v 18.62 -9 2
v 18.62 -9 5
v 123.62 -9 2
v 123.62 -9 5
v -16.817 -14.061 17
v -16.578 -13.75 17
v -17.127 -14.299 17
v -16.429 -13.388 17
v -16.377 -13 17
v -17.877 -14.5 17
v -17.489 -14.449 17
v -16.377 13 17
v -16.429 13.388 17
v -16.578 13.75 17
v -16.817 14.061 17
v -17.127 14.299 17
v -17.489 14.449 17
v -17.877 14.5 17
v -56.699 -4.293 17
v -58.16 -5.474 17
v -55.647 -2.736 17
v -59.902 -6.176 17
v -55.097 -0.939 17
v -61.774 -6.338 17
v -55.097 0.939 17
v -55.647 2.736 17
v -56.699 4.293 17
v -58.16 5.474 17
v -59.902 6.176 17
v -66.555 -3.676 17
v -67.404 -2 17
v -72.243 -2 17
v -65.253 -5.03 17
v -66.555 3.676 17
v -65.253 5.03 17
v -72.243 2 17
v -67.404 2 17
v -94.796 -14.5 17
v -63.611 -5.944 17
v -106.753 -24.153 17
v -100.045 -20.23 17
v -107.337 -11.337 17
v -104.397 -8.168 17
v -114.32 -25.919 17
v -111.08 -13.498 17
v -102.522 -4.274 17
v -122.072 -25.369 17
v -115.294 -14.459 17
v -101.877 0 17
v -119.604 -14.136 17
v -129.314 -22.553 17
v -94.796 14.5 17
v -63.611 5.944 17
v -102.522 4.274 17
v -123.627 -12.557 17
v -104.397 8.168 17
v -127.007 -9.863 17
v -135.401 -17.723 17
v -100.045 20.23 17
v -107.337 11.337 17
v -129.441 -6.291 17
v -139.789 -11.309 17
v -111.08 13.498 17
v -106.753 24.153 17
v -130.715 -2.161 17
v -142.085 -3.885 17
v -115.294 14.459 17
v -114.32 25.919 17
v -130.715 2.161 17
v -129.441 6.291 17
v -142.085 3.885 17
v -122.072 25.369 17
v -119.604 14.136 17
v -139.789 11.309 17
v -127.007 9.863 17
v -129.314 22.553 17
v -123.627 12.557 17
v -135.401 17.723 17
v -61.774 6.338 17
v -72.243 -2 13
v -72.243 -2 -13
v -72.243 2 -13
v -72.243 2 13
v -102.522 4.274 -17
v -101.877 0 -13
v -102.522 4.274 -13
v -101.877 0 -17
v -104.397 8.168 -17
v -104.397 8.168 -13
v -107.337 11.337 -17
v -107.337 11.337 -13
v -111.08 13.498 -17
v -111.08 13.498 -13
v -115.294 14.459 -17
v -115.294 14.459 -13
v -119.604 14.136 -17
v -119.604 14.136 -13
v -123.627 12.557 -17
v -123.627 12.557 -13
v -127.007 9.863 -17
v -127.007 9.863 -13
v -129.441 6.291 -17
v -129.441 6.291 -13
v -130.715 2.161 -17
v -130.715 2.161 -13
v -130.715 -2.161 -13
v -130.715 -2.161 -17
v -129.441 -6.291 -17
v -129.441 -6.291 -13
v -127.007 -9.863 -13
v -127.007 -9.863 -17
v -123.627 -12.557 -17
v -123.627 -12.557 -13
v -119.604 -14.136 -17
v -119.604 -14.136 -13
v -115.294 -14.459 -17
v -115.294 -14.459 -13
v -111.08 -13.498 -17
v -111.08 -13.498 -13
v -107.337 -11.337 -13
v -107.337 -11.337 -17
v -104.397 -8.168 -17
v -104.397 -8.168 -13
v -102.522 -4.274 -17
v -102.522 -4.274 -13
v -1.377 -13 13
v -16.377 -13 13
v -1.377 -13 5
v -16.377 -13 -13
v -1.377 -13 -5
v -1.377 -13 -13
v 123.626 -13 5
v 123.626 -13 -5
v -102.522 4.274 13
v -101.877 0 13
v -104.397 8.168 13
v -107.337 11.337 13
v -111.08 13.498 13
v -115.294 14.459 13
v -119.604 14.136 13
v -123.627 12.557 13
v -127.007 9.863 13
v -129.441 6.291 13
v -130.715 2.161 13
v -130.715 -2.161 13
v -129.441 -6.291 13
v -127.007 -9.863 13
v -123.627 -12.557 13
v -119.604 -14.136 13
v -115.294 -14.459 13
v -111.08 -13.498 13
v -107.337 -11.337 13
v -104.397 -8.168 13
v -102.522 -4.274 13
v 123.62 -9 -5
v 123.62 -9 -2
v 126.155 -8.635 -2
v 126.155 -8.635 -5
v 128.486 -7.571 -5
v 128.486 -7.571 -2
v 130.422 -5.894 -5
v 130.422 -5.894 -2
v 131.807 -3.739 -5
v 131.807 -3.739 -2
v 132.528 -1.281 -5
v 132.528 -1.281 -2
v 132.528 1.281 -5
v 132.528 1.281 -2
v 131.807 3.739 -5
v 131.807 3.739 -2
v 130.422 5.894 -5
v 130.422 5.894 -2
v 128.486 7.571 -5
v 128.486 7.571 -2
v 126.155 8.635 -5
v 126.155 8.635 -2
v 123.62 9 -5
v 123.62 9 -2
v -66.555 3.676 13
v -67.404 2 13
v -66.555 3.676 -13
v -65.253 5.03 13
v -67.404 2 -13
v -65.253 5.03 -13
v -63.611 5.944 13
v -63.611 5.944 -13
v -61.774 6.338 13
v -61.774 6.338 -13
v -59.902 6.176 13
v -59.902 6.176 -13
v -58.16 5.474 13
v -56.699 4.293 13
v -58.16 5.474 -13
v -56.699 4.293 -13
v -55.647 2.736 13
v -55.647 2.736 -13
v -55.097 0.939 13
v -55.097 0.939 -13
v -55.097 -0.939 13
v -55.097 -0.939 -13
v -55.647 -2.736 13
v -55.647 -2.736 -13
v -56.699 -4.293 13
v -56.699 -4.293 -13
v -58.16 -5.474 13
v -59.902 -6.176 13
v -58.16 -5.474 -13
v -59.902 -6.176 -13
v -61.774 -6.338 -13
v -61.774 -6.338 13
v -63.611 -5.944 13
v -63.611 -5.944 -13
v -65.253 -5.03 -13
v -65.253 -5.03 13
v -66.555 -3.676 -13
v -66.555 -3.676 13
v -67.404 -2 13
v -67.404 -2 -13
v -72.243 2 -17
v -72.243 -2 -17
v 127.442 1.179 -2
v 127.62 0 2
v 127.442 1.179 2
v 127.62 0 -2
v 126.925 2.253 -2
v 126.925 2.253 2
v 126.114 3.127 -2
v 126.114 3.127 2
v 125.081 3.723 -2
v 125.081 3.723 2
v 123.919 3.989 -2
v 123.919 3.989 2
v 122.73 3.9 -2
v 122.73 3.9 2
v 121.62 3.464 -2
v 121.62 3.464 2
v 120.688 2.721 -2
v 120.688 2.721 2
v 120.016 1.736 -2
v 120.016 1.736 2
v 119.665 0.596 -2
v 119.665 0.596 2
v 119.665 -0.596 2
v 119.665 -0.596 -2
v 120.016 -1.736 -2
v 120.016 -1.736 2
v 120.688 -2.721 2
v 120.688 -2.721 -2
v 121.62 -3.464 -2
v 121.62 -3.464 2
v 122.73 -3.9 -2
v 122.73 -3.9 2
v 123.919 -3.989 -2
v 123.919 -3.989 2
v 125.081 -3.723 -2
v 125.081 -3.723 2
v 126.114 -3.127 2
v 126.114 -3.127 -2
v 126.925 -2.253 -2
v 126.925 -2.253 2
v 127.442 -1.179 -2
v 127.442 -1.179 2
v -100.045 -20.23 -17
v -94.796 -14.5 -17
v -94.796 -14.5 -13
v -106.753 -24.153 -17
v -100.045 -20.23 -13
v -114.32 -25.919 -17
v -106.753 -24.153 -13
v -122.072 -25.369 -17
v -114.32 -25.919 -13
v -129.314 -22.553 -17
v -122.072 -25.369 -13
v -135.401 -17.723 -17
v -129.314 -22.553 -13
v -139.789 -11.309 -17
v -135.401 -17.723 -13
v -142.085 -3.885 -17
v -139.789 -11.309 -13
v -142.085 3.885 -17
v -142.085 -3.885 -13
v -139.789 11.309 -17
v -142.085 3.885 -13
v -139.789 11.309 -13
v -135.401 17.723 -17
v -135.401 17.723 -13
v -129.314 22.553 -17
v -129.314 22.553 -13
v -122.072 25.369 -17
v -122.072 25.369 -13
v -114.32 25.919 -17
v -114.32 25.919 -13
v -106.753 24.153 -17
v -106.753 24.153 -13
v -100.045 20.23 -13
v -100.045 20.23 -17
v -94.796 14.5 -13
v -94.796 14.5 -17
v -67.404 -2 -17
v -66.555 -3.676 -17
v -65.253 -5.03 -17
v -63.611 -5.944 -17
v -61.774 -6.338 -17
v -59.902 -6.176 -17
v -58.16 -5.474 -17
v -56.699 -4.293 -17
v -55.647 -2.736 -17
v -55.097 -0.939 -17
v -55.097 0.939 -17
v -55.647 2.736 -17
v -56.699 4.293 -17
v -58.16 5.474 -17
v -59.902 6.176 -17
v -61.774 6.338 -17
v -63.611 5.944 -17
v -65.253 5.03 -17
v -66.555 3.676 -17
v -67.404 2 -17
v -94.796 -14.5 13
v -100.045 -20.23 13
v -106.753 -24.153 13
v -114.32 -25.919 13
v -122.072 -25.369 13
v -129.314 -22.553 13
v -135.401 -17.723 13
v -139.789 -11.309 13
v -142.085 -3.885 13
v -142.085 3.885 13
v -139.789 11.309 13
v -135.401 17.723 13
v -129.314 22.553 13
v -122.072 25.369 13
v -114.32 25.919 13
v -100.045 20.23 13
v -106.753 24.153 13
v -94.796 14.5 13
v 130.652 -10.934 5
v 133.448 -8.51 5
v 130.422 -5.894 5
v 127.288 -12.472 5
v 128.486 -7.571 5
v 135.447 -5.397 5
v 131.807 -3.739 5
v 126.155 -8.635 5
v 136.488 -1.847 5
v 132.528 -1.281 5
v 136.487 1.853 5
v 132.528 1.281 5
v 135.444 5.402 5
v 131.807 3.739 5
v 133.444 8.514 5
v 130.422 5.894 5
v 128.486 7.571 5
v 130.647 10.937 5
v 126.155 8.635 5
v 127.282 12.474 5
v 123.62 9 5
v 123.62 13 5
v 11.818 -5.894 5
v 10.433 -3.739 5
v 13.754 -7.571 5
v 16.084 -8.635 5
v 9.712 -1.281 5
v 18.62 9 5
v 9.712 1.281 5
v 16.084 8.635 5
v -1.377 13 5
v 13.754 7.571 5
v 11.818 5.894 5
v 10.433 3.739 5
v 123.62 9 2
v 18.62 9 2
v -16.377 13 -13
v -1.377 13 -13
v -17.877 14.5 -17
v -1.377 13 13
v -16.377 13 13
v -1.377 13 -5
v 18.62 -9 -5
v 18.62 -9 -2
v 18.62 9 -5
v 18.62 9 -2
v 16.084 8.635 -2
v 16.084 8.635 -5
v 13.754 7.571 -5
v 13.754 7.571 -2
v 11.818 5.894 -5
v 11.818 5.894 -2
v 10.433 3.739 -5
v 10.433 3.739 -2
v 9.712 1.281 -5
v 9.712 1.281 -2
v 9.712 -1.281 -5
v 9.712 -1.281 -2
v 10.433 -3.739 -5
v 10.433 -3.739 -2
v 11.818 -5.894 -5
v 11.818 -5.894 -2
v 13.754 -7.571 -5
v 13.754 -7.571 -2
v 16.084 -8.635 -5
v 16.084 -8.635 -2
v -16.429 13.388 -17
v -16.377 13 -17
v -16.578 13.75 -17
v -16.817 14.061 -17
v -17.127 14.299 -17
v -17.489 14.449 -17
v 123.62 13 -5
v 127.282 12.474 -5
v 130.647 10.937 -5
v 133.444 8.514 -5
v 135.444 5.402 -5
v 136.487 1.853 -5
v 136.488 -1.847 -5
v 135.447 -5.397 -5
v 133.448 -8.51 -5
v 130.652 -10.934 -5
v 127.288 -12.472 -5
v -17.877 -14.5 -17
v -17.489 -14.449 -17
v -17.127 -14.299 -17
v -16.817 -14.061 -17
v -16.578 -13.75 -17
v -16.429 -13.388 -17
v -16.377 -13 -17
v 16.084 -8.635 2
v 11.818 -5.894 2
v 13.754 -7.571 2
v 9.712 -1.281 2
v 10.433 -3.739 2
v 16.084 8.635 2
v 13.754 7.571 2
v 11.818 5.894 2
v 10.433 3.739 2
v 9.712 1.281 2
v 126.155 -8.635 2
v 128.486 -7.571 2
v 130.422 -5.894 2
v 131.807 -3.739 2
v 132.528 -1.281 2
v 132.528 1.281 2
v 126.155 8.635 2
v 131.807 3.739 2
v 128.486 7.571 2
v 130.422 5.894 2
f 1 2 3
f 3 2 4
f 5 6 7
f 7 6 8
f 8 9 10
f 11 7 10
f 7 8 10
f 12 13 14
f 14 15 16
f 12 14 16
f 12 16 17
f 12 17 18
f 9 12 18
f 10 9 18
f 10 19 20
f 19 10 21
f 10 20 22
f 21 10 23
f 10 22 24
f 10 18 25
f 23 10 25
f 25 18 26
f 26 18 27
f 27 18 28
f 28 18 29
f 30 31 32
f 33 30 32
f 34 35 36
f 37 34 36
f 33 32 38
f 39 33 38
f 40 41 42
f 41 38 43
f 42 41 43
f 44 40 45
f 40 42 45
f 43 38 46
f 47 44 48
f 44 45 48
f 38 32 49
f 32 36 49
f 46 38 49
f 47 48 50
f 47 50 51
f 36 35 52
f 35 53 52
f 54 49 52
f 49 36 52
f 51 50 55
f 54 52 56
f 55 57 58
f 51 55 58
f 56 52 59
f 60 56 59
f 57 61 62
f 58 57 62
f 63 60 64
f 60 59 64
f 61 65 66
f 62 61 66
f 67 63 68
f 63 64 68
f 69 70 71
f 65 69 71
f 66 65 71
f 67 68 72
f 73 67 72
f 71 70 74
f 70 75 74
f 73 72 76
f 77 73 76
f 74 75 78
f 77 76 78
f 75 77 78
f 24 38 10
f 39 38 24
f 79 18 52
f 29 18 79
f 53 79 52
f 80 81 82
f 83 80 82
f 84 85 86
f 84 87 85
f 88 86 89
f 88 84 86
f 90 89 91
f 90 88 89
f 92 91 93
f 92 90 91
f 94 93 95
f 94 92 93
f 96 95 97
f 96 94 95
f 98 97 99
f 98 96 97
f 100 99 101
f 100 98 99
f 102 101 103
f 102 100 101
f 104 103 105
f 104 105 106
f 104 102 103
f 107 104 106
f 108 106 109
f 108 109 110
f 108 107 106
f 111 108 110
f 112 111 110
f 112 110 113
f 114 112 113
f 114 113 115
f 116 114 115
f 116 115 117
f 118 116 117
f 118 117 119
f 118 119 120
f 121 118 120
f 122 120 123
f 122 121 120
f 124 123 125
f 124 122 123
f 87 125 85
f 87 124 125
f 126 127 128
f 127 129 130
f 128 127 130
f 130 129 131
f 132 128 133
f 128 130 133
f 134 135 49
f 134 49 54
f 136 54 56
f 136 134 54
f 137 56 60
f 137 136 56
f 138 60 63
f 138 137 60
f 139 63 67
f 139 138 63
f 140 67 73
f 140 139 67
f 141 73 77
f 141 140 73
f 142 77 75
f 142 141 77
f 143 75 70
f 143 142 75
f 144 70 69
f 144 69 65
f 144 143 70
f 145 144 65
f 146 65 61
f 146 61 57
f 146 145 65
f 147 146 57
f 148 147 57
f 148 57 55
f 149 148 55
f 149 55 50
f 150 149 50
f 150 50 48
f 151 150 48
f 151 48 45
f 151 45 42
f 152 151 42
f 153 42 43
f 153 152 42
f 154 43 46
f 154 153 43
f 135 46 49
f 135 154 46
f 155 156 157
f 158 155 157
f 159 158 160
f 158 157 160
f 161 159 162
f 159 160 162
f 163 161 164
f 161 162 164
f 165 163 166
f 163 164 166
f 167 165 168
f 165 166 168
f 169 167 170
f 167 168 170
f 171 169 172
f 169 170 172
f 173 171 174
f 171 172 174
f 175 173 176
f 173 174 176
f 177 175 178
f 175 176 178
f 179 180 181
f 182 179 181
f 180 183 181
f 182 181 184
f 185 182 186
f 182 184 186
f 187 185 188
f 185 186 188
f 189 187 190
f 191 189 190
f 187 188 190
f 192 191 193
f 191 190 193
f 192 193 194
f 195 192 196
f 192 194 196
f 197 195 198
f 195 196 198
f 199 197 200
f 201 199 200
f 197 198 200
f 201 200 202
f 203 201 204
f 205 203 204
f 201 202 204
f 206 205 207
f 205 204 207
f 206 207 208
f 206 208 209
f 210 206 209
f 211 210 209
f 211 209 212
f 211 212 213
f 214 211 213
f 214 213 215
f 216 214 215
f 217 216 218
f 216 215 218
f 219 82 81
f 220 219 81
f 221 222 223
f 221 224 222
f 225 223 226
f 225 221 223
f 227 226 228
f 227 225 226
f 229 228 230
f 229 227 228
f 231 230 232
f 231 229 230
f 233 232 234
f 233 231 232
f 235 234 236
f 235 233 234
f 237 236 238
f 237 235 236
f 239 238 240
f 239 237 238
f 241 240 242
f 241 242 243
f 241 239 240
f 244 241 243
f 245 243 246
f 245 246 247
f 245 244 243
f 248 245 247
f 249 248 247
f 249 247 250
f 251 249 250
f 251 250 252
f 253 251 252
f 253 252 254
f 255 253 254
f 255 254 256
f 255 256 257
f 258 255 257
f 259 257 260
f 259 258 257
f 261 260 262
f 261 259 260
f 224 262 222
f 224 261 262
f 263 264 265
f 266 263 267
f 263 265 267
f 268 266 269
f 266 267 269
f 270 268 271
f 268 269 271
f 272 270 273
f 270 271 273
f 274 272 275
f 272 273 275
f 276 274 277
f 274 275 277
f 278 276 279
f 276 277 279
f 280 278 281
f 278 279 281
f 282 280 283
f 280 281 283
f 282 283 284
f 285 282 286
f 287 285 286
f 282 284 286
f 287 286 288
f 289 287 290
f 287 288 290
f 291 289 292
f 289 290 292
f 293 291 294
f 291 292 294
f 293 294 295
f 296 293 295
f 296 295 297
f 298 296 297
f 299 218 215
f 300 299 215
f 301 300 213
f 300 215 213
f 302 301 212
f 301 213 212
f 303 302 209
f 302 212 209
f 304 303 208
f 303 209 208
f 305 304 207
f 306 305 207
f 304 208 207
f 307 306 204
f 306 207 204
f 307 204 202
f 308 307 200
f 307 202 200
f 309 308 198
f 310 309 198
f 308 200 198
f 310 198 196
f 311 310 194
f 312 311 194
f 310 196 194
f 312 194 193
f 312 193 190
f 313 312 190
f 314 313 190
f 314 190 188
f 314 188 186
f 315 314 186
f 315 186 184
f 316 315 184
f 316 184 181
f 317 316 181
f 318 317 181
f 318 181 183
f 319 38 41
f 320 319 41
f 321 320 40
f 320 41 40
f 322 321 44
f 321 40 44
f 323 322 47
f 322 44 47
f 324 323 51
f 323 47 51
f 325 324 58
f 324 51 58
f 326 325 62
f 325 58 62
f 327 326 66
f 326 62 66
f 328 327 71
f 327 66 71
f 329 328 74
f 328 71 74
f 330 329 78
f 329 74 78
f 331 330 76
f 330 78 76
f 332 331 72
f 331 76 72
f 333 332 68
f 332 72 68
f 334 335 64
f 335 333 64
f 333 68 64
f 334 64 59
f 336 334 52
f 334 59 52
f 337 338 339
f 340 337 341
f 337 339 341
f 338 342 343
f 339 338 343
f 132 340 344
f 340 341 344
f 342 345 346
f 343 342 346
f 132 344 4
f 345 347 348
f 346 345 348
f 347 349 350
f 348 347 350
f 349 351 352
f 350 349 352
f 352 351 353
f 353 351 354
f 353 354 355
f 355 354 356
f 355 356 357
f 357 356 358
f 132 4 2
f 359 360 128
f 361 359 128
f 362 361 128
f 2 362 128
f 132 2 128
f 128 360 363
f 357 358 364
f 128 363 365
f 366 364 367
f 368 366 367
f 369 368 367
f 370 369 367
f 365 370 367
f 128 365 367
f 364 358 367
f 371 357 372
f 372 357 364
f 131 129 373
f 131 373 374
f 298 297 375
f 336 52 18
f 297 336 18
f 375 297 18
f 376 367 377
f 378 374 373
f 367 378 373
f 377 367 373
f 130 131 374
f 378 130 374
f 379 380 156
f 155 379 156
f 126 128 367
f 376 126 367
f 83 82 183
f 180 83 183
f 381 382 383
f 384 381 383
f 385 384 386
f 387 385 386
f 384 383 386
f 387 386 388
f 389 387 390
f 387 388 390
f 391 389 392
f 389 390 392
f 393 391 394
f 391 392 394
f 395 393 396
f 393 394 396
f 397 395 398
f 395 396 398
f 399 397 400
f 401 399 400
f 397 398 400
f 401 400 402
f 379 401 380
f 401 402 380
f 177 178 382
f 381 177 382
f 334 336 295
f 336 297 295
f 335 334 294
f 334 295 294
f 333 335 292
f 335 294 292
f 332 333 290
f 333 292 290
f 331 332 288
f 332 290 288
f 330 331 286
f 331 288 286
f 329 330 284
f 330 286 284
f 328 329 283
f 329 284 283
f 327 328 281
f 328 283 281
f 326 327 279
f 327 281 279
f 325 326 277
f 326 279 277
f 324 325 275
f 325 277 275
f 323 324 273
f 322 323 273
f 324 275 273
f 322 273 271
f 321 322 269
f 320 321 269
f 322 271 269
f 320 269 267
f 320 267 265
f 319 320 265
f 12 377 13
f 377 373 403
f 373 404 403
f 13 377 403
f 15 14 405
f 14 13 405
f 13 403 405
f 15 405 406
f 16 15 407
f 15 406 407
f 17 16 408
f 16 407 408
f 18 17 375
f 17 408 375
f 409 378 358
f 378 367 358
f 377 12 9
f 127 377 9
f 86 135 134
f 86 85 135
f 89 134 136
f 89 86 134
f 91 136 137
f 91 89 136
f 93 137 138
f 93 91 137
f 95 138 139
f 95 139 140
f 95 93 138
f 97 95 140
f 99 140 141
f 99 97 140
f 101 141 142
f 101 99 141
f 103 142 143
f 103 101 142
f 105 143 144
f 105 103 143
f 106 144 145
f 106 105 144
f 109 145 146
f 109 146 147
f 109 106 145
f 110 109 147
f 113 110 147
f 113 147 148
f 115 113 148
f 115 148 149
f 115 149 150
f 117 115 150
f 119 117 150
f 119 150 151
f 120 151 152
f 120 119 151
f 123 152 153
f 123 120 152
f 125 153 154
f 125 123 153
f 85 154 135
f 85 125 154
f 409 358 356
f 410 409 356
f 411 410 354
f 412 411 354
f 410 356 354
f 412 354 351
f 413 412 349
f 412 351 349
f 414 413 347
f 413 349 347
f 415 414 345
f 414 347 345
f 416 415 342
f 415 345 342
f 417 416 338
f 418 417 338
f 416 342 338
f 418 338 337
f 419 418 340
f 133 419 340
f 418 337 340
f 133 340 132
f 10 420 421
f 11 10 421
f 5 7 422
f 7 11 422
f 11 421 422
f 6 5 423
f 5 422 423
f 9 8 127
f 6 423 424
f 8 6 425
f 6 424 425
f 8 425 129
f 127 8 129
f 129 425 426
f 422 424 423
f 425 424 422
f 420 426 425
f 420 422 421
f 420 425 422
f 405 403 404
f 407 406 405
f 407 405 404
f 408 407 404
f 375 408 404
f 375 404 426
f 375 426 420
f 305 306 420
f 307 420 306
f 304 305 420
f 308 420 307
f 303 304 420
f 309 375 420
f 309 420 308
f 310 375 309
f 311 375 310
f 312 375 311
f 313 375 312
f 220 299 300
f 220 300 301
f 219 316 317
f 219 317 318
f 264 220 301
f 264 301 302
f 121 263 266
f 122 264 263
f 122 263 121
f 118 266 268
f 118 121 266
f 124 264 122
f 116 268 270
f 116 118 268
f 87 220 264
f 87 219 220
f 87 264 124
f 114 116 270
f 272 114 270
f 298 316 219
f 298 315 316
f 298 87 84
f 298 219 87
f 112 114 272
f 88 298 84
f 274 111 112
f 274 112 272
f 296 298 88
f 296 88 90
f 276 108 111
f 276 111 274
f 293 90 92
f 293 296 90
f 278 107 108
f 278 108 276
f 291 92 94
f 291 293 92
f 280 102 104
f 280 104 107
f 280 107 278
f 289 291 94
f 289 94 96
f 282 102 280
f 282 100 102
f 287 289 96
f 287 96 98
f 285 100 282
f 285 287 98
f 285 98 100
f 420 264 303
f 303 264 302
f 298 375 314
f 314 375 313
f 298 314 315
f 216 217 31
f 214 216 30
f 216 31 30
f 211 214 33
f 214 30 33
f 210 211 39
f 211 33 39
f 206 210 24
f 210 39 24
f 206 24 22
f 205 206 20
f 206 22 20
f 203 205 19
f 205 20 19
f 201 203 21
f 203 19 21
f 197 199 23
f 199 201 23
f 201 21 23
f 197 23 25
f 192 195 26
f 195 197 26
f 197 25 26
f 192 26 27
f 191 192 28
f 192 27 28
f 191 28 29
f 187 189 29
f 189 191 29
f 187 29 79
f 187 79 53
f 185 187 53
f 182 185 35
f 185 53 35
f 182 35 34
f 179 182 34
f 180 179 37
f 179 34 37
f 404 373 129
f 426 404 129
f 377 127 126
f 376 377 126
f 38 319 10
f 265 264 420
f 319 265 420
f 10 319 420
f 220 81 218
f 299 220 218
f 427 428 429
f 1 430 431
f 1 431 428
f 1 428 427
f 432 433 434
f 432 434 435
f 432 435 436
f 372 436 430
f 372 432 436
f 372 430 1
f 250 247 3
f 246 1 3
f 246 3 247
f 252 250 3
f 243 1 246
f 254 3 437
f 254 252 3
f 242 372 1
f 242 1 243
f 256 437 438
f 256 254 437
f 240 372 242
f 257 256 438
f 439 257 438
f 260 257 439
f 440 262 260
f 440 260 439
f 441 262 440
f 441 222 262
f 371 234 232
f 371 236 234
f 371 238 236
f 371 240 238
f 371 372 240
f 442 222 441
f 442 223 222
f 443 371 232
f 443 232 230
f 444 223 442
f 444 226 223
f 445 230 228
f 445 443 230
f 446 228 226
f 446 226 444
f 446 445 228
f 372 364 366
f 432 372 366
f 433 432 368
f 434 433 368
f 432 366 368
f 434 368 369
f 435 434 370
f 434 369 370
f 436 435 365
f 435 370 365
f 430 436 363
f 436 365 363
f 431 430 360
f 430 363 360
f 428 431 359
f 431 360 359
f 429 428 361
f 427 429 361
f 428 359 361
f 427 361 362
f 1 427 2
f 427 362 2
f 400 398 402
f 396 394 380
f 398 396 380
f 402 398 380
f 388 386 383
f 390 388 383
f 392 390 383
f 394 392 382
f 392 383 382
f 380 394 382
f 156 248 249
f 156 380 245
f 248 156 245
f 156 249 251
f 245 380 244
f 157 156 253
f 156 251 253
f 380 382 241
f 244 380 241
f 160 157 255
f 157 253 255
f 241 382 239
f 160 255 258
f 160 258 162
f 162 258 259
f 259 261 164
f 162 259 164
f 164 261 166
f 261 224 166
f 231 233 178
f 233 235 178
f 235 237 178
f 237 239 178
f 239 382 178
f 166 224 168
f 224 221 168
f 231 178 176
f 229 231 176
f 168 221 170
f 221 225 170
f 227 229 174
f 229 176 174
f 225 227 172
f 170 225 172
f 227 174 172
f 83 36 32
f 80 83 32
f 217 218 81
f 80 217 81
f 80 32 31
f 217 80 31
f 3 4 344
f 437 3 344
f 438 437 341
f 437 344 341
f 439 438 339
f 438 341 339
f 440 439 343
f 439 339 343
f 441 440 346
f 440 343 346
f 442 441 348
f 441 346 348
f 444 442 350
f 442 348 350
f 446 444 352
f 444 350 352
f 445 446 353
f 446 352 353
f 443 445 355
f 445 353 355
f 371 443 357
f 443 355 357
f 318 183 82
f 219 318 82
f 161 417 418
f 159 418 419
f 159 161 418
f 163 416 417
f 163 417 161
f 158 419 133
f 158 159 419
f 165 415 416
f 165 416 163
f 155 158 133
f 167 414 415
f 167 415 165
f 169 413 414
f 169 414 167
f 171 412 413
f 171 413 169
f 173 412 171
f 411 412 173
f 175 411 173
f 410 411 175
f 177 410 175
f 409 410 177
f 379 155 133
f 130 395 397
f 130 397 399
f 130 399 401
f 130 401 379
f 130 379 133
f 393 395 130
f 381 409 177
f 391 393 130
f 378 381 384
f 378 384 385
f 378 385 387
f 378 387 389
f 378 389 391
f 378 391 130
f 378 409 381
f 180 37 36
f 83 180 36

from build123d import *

# Parameters (mm, degrees)
ESBO_O1_R                = 14.5
RESSALTO_EXTRUS_O1_DEPTH = 17
ESBO_O1_4_R              = 14.5
ESBO_O1_4_R_2            = 4
RESSALTO_EXTRUS_O2_DEPTH = 13
RESSALTO_EXTRUS_O3_DEPTH = 5
ESBO_O1_9_R              = 4
RESSALTO_EXTRUS_O4_DEPTH = 2


with BuildPart() as part:
    # Esboço1 → Ressalto-extrusão1 (new, symmetric)
    with BuildSketch(Plane.XY):
        with BuildLine():
            ThreePointArc((-16.377431433, -13), (-16.816771262, -14.060660172), (-17.877431433, -14.5))
            Line((-17.877431433, -14.5), (-93.857447864, -14.5))
            Line((-93.857447864, -14.5), (-94.796189578, -14.5))
            ThreePointArc((-94.796189578, -14.5), (-142.377431433, 0), (-94.796189578, 14.5))
            Line((-94.796189578, 14.5), (-93.857447864, 14.5))
            Line((-93.857447864, 14.5), (-17.877431433, 14.5))
            ThreePointArc((-17.877431433, 14.5), (-16.816771262, 14.060660172), (-16.377431433, 13))
            Line((-16.377431433, 13), (-16.377431433, -13))
        make_face()
        with Locations((-116.377431433, 0)):
            Circle(ESBO_O1_R, mode=Mode.SUBTRACT)
        with BuildLine():
            ThreePointArc((-67.404246513, -2), (-55.027431433, 0), (-67.404246513, 2))
            Line((-67.404246513, 2), (-72.243354514, 2))
            Line((-72.243354514, 2), (-72.243354514, -2))
            Line((-72.243354514, -2), (-67.404246513, -2))
        make_face(mode=Mode.SUBTRACT)
    extrude(amount=RESSALTO_EXTRUS_O1_DEPTH, both=True)

    # Esboço1<4> → Ressalto-extrusão2 (add, symmetric)
    # profile 1 of 3: a face of its own
    with BuildSketch(Plane.XY):
        with BuildLine():
            Line((-17.877431433, 14.5), (-93.857447864, 14.5))
            Line((-93.857447864, 14.5), (-94.796189578, 14.5))
            ThreePointArc((-94.796189578, 14.5), (-142.377431433, 0), (-94.796189578, -14.5))
            Line((-94.796189578, -14.5), (-93.857447864, -14.5))
            Line((-93.857447864, -14.5), (-17.877431433, -14.5))
            ThreePointArc((-17.877431433, -14.5), (-16.816771262, -14.060660172), (-16.377431433, -13))
            Line((-16.377431433, -13), (-16.377431433, 13))
            ThreePointArc((-16.377431433, 13), (-16.816771262, 14.060660172), (-17.877431433, 14.5))
        make_face()
        with Locations((-116.377431433, 0)):
            Circle(ESBO_O1_4_R, mode=Mode.SUBTRACT)
        with BuildLine():
            ThreePointArc((-67.404246513, 2), (-55.027431433, 0), (-67.404246513, -2))
            Line((-67.404246513, -2), (-72.243354514, -2))
            Line((-72.243354514, -2), (-72.243354514, 2))
            Line((-72.243354514, 2), (-67.404246513, 2))
        make_face(mode=Mode.SUBTRACT)
    # profile 2 of 3: a face of its own
    with BuildSketch(Plane.XY):
        Polygon((-1.377431433, 13.000001379), (-16.377431433, 13), (-16.377431433, -13), (-1.377431433, -13), align=None)
    # profile 3 of 3: a face of its own
    with BuildSketch(Plane.XY):
        with Locations((123.619903756, 0)):
            Circle(ESBO_O1_4_R_2)
    extrude(amount=RESSALTO_EXTRUS_O2_DEPTH, both=True)


with BuildPart() as ressalto_extrus_o2_kept_piece:
    # of the separate pieces the step leaves, the one the design keeps (ressalto_extrus_o2_pieces_kept)
    add(part.part.solids().sort_by_distance((-16.377431433, -13, -17))[0])

    # Esboço1<8> → Ressalto-extrusão3 (add, symmetric)
    with BuildSketch(Plane.XY):
        with BuildLine():
            Line((123.625891638, -13), (-1.377431433, -13))
            Line((-1.377431433, -13), (-1.377431433, 13.000001379))
            Line((-1.377431433, 13.000001379), (123.619903756, 13.000001379))
            ThreePointArc((123.619903756, 13.000001379), (136.61990479, 0.002993941), (123.625891638, -13))
        make_face()
        with BuildLine():
            ThreePointArc((18.619903756, 9), (9.619903756, 0), (18.619903756, -9))
            Line((18.619903756, -9), (123.619903756, -9))
            ThreePointArc((123.619903756, -9), (132.619903756, 0), (123.619903756, 9))
            Line((123.619903756, 9), (18.619903756, 9))
        make_face(mode=Mode.SUBTRACT)
    extrude(amount=RESSALTO_EXTRUS_O3_DEPTH, both=True)

    # Esboço1<9> → Ressalto-extrusão4 (add, symmetric)
    with BuildSketch(Plane.XY):
        with BuildLine():
            Line((123.619903756, 9), (18.619903756, 9))
            ThreePointArc((18.619903756, 9), (9.619903756, 0), (18.619903756, -9))
            Line((18.619903756, -9), (123.619903756, -9))
            ThreePointArc((123.619903756, -9), (132.619903756, 0), (123.619903756, 9))
        make_face()
        with Locations((123.619903756, 0)):
            Circle(ESBO_O1_9_R, mode=Mode.SUBTRACT)
    extrude(amount=RESSALTO_EXTRUS_O4_DEPTH, both=True)


solid = ressalto_extrus_o2_kept_piece.part
